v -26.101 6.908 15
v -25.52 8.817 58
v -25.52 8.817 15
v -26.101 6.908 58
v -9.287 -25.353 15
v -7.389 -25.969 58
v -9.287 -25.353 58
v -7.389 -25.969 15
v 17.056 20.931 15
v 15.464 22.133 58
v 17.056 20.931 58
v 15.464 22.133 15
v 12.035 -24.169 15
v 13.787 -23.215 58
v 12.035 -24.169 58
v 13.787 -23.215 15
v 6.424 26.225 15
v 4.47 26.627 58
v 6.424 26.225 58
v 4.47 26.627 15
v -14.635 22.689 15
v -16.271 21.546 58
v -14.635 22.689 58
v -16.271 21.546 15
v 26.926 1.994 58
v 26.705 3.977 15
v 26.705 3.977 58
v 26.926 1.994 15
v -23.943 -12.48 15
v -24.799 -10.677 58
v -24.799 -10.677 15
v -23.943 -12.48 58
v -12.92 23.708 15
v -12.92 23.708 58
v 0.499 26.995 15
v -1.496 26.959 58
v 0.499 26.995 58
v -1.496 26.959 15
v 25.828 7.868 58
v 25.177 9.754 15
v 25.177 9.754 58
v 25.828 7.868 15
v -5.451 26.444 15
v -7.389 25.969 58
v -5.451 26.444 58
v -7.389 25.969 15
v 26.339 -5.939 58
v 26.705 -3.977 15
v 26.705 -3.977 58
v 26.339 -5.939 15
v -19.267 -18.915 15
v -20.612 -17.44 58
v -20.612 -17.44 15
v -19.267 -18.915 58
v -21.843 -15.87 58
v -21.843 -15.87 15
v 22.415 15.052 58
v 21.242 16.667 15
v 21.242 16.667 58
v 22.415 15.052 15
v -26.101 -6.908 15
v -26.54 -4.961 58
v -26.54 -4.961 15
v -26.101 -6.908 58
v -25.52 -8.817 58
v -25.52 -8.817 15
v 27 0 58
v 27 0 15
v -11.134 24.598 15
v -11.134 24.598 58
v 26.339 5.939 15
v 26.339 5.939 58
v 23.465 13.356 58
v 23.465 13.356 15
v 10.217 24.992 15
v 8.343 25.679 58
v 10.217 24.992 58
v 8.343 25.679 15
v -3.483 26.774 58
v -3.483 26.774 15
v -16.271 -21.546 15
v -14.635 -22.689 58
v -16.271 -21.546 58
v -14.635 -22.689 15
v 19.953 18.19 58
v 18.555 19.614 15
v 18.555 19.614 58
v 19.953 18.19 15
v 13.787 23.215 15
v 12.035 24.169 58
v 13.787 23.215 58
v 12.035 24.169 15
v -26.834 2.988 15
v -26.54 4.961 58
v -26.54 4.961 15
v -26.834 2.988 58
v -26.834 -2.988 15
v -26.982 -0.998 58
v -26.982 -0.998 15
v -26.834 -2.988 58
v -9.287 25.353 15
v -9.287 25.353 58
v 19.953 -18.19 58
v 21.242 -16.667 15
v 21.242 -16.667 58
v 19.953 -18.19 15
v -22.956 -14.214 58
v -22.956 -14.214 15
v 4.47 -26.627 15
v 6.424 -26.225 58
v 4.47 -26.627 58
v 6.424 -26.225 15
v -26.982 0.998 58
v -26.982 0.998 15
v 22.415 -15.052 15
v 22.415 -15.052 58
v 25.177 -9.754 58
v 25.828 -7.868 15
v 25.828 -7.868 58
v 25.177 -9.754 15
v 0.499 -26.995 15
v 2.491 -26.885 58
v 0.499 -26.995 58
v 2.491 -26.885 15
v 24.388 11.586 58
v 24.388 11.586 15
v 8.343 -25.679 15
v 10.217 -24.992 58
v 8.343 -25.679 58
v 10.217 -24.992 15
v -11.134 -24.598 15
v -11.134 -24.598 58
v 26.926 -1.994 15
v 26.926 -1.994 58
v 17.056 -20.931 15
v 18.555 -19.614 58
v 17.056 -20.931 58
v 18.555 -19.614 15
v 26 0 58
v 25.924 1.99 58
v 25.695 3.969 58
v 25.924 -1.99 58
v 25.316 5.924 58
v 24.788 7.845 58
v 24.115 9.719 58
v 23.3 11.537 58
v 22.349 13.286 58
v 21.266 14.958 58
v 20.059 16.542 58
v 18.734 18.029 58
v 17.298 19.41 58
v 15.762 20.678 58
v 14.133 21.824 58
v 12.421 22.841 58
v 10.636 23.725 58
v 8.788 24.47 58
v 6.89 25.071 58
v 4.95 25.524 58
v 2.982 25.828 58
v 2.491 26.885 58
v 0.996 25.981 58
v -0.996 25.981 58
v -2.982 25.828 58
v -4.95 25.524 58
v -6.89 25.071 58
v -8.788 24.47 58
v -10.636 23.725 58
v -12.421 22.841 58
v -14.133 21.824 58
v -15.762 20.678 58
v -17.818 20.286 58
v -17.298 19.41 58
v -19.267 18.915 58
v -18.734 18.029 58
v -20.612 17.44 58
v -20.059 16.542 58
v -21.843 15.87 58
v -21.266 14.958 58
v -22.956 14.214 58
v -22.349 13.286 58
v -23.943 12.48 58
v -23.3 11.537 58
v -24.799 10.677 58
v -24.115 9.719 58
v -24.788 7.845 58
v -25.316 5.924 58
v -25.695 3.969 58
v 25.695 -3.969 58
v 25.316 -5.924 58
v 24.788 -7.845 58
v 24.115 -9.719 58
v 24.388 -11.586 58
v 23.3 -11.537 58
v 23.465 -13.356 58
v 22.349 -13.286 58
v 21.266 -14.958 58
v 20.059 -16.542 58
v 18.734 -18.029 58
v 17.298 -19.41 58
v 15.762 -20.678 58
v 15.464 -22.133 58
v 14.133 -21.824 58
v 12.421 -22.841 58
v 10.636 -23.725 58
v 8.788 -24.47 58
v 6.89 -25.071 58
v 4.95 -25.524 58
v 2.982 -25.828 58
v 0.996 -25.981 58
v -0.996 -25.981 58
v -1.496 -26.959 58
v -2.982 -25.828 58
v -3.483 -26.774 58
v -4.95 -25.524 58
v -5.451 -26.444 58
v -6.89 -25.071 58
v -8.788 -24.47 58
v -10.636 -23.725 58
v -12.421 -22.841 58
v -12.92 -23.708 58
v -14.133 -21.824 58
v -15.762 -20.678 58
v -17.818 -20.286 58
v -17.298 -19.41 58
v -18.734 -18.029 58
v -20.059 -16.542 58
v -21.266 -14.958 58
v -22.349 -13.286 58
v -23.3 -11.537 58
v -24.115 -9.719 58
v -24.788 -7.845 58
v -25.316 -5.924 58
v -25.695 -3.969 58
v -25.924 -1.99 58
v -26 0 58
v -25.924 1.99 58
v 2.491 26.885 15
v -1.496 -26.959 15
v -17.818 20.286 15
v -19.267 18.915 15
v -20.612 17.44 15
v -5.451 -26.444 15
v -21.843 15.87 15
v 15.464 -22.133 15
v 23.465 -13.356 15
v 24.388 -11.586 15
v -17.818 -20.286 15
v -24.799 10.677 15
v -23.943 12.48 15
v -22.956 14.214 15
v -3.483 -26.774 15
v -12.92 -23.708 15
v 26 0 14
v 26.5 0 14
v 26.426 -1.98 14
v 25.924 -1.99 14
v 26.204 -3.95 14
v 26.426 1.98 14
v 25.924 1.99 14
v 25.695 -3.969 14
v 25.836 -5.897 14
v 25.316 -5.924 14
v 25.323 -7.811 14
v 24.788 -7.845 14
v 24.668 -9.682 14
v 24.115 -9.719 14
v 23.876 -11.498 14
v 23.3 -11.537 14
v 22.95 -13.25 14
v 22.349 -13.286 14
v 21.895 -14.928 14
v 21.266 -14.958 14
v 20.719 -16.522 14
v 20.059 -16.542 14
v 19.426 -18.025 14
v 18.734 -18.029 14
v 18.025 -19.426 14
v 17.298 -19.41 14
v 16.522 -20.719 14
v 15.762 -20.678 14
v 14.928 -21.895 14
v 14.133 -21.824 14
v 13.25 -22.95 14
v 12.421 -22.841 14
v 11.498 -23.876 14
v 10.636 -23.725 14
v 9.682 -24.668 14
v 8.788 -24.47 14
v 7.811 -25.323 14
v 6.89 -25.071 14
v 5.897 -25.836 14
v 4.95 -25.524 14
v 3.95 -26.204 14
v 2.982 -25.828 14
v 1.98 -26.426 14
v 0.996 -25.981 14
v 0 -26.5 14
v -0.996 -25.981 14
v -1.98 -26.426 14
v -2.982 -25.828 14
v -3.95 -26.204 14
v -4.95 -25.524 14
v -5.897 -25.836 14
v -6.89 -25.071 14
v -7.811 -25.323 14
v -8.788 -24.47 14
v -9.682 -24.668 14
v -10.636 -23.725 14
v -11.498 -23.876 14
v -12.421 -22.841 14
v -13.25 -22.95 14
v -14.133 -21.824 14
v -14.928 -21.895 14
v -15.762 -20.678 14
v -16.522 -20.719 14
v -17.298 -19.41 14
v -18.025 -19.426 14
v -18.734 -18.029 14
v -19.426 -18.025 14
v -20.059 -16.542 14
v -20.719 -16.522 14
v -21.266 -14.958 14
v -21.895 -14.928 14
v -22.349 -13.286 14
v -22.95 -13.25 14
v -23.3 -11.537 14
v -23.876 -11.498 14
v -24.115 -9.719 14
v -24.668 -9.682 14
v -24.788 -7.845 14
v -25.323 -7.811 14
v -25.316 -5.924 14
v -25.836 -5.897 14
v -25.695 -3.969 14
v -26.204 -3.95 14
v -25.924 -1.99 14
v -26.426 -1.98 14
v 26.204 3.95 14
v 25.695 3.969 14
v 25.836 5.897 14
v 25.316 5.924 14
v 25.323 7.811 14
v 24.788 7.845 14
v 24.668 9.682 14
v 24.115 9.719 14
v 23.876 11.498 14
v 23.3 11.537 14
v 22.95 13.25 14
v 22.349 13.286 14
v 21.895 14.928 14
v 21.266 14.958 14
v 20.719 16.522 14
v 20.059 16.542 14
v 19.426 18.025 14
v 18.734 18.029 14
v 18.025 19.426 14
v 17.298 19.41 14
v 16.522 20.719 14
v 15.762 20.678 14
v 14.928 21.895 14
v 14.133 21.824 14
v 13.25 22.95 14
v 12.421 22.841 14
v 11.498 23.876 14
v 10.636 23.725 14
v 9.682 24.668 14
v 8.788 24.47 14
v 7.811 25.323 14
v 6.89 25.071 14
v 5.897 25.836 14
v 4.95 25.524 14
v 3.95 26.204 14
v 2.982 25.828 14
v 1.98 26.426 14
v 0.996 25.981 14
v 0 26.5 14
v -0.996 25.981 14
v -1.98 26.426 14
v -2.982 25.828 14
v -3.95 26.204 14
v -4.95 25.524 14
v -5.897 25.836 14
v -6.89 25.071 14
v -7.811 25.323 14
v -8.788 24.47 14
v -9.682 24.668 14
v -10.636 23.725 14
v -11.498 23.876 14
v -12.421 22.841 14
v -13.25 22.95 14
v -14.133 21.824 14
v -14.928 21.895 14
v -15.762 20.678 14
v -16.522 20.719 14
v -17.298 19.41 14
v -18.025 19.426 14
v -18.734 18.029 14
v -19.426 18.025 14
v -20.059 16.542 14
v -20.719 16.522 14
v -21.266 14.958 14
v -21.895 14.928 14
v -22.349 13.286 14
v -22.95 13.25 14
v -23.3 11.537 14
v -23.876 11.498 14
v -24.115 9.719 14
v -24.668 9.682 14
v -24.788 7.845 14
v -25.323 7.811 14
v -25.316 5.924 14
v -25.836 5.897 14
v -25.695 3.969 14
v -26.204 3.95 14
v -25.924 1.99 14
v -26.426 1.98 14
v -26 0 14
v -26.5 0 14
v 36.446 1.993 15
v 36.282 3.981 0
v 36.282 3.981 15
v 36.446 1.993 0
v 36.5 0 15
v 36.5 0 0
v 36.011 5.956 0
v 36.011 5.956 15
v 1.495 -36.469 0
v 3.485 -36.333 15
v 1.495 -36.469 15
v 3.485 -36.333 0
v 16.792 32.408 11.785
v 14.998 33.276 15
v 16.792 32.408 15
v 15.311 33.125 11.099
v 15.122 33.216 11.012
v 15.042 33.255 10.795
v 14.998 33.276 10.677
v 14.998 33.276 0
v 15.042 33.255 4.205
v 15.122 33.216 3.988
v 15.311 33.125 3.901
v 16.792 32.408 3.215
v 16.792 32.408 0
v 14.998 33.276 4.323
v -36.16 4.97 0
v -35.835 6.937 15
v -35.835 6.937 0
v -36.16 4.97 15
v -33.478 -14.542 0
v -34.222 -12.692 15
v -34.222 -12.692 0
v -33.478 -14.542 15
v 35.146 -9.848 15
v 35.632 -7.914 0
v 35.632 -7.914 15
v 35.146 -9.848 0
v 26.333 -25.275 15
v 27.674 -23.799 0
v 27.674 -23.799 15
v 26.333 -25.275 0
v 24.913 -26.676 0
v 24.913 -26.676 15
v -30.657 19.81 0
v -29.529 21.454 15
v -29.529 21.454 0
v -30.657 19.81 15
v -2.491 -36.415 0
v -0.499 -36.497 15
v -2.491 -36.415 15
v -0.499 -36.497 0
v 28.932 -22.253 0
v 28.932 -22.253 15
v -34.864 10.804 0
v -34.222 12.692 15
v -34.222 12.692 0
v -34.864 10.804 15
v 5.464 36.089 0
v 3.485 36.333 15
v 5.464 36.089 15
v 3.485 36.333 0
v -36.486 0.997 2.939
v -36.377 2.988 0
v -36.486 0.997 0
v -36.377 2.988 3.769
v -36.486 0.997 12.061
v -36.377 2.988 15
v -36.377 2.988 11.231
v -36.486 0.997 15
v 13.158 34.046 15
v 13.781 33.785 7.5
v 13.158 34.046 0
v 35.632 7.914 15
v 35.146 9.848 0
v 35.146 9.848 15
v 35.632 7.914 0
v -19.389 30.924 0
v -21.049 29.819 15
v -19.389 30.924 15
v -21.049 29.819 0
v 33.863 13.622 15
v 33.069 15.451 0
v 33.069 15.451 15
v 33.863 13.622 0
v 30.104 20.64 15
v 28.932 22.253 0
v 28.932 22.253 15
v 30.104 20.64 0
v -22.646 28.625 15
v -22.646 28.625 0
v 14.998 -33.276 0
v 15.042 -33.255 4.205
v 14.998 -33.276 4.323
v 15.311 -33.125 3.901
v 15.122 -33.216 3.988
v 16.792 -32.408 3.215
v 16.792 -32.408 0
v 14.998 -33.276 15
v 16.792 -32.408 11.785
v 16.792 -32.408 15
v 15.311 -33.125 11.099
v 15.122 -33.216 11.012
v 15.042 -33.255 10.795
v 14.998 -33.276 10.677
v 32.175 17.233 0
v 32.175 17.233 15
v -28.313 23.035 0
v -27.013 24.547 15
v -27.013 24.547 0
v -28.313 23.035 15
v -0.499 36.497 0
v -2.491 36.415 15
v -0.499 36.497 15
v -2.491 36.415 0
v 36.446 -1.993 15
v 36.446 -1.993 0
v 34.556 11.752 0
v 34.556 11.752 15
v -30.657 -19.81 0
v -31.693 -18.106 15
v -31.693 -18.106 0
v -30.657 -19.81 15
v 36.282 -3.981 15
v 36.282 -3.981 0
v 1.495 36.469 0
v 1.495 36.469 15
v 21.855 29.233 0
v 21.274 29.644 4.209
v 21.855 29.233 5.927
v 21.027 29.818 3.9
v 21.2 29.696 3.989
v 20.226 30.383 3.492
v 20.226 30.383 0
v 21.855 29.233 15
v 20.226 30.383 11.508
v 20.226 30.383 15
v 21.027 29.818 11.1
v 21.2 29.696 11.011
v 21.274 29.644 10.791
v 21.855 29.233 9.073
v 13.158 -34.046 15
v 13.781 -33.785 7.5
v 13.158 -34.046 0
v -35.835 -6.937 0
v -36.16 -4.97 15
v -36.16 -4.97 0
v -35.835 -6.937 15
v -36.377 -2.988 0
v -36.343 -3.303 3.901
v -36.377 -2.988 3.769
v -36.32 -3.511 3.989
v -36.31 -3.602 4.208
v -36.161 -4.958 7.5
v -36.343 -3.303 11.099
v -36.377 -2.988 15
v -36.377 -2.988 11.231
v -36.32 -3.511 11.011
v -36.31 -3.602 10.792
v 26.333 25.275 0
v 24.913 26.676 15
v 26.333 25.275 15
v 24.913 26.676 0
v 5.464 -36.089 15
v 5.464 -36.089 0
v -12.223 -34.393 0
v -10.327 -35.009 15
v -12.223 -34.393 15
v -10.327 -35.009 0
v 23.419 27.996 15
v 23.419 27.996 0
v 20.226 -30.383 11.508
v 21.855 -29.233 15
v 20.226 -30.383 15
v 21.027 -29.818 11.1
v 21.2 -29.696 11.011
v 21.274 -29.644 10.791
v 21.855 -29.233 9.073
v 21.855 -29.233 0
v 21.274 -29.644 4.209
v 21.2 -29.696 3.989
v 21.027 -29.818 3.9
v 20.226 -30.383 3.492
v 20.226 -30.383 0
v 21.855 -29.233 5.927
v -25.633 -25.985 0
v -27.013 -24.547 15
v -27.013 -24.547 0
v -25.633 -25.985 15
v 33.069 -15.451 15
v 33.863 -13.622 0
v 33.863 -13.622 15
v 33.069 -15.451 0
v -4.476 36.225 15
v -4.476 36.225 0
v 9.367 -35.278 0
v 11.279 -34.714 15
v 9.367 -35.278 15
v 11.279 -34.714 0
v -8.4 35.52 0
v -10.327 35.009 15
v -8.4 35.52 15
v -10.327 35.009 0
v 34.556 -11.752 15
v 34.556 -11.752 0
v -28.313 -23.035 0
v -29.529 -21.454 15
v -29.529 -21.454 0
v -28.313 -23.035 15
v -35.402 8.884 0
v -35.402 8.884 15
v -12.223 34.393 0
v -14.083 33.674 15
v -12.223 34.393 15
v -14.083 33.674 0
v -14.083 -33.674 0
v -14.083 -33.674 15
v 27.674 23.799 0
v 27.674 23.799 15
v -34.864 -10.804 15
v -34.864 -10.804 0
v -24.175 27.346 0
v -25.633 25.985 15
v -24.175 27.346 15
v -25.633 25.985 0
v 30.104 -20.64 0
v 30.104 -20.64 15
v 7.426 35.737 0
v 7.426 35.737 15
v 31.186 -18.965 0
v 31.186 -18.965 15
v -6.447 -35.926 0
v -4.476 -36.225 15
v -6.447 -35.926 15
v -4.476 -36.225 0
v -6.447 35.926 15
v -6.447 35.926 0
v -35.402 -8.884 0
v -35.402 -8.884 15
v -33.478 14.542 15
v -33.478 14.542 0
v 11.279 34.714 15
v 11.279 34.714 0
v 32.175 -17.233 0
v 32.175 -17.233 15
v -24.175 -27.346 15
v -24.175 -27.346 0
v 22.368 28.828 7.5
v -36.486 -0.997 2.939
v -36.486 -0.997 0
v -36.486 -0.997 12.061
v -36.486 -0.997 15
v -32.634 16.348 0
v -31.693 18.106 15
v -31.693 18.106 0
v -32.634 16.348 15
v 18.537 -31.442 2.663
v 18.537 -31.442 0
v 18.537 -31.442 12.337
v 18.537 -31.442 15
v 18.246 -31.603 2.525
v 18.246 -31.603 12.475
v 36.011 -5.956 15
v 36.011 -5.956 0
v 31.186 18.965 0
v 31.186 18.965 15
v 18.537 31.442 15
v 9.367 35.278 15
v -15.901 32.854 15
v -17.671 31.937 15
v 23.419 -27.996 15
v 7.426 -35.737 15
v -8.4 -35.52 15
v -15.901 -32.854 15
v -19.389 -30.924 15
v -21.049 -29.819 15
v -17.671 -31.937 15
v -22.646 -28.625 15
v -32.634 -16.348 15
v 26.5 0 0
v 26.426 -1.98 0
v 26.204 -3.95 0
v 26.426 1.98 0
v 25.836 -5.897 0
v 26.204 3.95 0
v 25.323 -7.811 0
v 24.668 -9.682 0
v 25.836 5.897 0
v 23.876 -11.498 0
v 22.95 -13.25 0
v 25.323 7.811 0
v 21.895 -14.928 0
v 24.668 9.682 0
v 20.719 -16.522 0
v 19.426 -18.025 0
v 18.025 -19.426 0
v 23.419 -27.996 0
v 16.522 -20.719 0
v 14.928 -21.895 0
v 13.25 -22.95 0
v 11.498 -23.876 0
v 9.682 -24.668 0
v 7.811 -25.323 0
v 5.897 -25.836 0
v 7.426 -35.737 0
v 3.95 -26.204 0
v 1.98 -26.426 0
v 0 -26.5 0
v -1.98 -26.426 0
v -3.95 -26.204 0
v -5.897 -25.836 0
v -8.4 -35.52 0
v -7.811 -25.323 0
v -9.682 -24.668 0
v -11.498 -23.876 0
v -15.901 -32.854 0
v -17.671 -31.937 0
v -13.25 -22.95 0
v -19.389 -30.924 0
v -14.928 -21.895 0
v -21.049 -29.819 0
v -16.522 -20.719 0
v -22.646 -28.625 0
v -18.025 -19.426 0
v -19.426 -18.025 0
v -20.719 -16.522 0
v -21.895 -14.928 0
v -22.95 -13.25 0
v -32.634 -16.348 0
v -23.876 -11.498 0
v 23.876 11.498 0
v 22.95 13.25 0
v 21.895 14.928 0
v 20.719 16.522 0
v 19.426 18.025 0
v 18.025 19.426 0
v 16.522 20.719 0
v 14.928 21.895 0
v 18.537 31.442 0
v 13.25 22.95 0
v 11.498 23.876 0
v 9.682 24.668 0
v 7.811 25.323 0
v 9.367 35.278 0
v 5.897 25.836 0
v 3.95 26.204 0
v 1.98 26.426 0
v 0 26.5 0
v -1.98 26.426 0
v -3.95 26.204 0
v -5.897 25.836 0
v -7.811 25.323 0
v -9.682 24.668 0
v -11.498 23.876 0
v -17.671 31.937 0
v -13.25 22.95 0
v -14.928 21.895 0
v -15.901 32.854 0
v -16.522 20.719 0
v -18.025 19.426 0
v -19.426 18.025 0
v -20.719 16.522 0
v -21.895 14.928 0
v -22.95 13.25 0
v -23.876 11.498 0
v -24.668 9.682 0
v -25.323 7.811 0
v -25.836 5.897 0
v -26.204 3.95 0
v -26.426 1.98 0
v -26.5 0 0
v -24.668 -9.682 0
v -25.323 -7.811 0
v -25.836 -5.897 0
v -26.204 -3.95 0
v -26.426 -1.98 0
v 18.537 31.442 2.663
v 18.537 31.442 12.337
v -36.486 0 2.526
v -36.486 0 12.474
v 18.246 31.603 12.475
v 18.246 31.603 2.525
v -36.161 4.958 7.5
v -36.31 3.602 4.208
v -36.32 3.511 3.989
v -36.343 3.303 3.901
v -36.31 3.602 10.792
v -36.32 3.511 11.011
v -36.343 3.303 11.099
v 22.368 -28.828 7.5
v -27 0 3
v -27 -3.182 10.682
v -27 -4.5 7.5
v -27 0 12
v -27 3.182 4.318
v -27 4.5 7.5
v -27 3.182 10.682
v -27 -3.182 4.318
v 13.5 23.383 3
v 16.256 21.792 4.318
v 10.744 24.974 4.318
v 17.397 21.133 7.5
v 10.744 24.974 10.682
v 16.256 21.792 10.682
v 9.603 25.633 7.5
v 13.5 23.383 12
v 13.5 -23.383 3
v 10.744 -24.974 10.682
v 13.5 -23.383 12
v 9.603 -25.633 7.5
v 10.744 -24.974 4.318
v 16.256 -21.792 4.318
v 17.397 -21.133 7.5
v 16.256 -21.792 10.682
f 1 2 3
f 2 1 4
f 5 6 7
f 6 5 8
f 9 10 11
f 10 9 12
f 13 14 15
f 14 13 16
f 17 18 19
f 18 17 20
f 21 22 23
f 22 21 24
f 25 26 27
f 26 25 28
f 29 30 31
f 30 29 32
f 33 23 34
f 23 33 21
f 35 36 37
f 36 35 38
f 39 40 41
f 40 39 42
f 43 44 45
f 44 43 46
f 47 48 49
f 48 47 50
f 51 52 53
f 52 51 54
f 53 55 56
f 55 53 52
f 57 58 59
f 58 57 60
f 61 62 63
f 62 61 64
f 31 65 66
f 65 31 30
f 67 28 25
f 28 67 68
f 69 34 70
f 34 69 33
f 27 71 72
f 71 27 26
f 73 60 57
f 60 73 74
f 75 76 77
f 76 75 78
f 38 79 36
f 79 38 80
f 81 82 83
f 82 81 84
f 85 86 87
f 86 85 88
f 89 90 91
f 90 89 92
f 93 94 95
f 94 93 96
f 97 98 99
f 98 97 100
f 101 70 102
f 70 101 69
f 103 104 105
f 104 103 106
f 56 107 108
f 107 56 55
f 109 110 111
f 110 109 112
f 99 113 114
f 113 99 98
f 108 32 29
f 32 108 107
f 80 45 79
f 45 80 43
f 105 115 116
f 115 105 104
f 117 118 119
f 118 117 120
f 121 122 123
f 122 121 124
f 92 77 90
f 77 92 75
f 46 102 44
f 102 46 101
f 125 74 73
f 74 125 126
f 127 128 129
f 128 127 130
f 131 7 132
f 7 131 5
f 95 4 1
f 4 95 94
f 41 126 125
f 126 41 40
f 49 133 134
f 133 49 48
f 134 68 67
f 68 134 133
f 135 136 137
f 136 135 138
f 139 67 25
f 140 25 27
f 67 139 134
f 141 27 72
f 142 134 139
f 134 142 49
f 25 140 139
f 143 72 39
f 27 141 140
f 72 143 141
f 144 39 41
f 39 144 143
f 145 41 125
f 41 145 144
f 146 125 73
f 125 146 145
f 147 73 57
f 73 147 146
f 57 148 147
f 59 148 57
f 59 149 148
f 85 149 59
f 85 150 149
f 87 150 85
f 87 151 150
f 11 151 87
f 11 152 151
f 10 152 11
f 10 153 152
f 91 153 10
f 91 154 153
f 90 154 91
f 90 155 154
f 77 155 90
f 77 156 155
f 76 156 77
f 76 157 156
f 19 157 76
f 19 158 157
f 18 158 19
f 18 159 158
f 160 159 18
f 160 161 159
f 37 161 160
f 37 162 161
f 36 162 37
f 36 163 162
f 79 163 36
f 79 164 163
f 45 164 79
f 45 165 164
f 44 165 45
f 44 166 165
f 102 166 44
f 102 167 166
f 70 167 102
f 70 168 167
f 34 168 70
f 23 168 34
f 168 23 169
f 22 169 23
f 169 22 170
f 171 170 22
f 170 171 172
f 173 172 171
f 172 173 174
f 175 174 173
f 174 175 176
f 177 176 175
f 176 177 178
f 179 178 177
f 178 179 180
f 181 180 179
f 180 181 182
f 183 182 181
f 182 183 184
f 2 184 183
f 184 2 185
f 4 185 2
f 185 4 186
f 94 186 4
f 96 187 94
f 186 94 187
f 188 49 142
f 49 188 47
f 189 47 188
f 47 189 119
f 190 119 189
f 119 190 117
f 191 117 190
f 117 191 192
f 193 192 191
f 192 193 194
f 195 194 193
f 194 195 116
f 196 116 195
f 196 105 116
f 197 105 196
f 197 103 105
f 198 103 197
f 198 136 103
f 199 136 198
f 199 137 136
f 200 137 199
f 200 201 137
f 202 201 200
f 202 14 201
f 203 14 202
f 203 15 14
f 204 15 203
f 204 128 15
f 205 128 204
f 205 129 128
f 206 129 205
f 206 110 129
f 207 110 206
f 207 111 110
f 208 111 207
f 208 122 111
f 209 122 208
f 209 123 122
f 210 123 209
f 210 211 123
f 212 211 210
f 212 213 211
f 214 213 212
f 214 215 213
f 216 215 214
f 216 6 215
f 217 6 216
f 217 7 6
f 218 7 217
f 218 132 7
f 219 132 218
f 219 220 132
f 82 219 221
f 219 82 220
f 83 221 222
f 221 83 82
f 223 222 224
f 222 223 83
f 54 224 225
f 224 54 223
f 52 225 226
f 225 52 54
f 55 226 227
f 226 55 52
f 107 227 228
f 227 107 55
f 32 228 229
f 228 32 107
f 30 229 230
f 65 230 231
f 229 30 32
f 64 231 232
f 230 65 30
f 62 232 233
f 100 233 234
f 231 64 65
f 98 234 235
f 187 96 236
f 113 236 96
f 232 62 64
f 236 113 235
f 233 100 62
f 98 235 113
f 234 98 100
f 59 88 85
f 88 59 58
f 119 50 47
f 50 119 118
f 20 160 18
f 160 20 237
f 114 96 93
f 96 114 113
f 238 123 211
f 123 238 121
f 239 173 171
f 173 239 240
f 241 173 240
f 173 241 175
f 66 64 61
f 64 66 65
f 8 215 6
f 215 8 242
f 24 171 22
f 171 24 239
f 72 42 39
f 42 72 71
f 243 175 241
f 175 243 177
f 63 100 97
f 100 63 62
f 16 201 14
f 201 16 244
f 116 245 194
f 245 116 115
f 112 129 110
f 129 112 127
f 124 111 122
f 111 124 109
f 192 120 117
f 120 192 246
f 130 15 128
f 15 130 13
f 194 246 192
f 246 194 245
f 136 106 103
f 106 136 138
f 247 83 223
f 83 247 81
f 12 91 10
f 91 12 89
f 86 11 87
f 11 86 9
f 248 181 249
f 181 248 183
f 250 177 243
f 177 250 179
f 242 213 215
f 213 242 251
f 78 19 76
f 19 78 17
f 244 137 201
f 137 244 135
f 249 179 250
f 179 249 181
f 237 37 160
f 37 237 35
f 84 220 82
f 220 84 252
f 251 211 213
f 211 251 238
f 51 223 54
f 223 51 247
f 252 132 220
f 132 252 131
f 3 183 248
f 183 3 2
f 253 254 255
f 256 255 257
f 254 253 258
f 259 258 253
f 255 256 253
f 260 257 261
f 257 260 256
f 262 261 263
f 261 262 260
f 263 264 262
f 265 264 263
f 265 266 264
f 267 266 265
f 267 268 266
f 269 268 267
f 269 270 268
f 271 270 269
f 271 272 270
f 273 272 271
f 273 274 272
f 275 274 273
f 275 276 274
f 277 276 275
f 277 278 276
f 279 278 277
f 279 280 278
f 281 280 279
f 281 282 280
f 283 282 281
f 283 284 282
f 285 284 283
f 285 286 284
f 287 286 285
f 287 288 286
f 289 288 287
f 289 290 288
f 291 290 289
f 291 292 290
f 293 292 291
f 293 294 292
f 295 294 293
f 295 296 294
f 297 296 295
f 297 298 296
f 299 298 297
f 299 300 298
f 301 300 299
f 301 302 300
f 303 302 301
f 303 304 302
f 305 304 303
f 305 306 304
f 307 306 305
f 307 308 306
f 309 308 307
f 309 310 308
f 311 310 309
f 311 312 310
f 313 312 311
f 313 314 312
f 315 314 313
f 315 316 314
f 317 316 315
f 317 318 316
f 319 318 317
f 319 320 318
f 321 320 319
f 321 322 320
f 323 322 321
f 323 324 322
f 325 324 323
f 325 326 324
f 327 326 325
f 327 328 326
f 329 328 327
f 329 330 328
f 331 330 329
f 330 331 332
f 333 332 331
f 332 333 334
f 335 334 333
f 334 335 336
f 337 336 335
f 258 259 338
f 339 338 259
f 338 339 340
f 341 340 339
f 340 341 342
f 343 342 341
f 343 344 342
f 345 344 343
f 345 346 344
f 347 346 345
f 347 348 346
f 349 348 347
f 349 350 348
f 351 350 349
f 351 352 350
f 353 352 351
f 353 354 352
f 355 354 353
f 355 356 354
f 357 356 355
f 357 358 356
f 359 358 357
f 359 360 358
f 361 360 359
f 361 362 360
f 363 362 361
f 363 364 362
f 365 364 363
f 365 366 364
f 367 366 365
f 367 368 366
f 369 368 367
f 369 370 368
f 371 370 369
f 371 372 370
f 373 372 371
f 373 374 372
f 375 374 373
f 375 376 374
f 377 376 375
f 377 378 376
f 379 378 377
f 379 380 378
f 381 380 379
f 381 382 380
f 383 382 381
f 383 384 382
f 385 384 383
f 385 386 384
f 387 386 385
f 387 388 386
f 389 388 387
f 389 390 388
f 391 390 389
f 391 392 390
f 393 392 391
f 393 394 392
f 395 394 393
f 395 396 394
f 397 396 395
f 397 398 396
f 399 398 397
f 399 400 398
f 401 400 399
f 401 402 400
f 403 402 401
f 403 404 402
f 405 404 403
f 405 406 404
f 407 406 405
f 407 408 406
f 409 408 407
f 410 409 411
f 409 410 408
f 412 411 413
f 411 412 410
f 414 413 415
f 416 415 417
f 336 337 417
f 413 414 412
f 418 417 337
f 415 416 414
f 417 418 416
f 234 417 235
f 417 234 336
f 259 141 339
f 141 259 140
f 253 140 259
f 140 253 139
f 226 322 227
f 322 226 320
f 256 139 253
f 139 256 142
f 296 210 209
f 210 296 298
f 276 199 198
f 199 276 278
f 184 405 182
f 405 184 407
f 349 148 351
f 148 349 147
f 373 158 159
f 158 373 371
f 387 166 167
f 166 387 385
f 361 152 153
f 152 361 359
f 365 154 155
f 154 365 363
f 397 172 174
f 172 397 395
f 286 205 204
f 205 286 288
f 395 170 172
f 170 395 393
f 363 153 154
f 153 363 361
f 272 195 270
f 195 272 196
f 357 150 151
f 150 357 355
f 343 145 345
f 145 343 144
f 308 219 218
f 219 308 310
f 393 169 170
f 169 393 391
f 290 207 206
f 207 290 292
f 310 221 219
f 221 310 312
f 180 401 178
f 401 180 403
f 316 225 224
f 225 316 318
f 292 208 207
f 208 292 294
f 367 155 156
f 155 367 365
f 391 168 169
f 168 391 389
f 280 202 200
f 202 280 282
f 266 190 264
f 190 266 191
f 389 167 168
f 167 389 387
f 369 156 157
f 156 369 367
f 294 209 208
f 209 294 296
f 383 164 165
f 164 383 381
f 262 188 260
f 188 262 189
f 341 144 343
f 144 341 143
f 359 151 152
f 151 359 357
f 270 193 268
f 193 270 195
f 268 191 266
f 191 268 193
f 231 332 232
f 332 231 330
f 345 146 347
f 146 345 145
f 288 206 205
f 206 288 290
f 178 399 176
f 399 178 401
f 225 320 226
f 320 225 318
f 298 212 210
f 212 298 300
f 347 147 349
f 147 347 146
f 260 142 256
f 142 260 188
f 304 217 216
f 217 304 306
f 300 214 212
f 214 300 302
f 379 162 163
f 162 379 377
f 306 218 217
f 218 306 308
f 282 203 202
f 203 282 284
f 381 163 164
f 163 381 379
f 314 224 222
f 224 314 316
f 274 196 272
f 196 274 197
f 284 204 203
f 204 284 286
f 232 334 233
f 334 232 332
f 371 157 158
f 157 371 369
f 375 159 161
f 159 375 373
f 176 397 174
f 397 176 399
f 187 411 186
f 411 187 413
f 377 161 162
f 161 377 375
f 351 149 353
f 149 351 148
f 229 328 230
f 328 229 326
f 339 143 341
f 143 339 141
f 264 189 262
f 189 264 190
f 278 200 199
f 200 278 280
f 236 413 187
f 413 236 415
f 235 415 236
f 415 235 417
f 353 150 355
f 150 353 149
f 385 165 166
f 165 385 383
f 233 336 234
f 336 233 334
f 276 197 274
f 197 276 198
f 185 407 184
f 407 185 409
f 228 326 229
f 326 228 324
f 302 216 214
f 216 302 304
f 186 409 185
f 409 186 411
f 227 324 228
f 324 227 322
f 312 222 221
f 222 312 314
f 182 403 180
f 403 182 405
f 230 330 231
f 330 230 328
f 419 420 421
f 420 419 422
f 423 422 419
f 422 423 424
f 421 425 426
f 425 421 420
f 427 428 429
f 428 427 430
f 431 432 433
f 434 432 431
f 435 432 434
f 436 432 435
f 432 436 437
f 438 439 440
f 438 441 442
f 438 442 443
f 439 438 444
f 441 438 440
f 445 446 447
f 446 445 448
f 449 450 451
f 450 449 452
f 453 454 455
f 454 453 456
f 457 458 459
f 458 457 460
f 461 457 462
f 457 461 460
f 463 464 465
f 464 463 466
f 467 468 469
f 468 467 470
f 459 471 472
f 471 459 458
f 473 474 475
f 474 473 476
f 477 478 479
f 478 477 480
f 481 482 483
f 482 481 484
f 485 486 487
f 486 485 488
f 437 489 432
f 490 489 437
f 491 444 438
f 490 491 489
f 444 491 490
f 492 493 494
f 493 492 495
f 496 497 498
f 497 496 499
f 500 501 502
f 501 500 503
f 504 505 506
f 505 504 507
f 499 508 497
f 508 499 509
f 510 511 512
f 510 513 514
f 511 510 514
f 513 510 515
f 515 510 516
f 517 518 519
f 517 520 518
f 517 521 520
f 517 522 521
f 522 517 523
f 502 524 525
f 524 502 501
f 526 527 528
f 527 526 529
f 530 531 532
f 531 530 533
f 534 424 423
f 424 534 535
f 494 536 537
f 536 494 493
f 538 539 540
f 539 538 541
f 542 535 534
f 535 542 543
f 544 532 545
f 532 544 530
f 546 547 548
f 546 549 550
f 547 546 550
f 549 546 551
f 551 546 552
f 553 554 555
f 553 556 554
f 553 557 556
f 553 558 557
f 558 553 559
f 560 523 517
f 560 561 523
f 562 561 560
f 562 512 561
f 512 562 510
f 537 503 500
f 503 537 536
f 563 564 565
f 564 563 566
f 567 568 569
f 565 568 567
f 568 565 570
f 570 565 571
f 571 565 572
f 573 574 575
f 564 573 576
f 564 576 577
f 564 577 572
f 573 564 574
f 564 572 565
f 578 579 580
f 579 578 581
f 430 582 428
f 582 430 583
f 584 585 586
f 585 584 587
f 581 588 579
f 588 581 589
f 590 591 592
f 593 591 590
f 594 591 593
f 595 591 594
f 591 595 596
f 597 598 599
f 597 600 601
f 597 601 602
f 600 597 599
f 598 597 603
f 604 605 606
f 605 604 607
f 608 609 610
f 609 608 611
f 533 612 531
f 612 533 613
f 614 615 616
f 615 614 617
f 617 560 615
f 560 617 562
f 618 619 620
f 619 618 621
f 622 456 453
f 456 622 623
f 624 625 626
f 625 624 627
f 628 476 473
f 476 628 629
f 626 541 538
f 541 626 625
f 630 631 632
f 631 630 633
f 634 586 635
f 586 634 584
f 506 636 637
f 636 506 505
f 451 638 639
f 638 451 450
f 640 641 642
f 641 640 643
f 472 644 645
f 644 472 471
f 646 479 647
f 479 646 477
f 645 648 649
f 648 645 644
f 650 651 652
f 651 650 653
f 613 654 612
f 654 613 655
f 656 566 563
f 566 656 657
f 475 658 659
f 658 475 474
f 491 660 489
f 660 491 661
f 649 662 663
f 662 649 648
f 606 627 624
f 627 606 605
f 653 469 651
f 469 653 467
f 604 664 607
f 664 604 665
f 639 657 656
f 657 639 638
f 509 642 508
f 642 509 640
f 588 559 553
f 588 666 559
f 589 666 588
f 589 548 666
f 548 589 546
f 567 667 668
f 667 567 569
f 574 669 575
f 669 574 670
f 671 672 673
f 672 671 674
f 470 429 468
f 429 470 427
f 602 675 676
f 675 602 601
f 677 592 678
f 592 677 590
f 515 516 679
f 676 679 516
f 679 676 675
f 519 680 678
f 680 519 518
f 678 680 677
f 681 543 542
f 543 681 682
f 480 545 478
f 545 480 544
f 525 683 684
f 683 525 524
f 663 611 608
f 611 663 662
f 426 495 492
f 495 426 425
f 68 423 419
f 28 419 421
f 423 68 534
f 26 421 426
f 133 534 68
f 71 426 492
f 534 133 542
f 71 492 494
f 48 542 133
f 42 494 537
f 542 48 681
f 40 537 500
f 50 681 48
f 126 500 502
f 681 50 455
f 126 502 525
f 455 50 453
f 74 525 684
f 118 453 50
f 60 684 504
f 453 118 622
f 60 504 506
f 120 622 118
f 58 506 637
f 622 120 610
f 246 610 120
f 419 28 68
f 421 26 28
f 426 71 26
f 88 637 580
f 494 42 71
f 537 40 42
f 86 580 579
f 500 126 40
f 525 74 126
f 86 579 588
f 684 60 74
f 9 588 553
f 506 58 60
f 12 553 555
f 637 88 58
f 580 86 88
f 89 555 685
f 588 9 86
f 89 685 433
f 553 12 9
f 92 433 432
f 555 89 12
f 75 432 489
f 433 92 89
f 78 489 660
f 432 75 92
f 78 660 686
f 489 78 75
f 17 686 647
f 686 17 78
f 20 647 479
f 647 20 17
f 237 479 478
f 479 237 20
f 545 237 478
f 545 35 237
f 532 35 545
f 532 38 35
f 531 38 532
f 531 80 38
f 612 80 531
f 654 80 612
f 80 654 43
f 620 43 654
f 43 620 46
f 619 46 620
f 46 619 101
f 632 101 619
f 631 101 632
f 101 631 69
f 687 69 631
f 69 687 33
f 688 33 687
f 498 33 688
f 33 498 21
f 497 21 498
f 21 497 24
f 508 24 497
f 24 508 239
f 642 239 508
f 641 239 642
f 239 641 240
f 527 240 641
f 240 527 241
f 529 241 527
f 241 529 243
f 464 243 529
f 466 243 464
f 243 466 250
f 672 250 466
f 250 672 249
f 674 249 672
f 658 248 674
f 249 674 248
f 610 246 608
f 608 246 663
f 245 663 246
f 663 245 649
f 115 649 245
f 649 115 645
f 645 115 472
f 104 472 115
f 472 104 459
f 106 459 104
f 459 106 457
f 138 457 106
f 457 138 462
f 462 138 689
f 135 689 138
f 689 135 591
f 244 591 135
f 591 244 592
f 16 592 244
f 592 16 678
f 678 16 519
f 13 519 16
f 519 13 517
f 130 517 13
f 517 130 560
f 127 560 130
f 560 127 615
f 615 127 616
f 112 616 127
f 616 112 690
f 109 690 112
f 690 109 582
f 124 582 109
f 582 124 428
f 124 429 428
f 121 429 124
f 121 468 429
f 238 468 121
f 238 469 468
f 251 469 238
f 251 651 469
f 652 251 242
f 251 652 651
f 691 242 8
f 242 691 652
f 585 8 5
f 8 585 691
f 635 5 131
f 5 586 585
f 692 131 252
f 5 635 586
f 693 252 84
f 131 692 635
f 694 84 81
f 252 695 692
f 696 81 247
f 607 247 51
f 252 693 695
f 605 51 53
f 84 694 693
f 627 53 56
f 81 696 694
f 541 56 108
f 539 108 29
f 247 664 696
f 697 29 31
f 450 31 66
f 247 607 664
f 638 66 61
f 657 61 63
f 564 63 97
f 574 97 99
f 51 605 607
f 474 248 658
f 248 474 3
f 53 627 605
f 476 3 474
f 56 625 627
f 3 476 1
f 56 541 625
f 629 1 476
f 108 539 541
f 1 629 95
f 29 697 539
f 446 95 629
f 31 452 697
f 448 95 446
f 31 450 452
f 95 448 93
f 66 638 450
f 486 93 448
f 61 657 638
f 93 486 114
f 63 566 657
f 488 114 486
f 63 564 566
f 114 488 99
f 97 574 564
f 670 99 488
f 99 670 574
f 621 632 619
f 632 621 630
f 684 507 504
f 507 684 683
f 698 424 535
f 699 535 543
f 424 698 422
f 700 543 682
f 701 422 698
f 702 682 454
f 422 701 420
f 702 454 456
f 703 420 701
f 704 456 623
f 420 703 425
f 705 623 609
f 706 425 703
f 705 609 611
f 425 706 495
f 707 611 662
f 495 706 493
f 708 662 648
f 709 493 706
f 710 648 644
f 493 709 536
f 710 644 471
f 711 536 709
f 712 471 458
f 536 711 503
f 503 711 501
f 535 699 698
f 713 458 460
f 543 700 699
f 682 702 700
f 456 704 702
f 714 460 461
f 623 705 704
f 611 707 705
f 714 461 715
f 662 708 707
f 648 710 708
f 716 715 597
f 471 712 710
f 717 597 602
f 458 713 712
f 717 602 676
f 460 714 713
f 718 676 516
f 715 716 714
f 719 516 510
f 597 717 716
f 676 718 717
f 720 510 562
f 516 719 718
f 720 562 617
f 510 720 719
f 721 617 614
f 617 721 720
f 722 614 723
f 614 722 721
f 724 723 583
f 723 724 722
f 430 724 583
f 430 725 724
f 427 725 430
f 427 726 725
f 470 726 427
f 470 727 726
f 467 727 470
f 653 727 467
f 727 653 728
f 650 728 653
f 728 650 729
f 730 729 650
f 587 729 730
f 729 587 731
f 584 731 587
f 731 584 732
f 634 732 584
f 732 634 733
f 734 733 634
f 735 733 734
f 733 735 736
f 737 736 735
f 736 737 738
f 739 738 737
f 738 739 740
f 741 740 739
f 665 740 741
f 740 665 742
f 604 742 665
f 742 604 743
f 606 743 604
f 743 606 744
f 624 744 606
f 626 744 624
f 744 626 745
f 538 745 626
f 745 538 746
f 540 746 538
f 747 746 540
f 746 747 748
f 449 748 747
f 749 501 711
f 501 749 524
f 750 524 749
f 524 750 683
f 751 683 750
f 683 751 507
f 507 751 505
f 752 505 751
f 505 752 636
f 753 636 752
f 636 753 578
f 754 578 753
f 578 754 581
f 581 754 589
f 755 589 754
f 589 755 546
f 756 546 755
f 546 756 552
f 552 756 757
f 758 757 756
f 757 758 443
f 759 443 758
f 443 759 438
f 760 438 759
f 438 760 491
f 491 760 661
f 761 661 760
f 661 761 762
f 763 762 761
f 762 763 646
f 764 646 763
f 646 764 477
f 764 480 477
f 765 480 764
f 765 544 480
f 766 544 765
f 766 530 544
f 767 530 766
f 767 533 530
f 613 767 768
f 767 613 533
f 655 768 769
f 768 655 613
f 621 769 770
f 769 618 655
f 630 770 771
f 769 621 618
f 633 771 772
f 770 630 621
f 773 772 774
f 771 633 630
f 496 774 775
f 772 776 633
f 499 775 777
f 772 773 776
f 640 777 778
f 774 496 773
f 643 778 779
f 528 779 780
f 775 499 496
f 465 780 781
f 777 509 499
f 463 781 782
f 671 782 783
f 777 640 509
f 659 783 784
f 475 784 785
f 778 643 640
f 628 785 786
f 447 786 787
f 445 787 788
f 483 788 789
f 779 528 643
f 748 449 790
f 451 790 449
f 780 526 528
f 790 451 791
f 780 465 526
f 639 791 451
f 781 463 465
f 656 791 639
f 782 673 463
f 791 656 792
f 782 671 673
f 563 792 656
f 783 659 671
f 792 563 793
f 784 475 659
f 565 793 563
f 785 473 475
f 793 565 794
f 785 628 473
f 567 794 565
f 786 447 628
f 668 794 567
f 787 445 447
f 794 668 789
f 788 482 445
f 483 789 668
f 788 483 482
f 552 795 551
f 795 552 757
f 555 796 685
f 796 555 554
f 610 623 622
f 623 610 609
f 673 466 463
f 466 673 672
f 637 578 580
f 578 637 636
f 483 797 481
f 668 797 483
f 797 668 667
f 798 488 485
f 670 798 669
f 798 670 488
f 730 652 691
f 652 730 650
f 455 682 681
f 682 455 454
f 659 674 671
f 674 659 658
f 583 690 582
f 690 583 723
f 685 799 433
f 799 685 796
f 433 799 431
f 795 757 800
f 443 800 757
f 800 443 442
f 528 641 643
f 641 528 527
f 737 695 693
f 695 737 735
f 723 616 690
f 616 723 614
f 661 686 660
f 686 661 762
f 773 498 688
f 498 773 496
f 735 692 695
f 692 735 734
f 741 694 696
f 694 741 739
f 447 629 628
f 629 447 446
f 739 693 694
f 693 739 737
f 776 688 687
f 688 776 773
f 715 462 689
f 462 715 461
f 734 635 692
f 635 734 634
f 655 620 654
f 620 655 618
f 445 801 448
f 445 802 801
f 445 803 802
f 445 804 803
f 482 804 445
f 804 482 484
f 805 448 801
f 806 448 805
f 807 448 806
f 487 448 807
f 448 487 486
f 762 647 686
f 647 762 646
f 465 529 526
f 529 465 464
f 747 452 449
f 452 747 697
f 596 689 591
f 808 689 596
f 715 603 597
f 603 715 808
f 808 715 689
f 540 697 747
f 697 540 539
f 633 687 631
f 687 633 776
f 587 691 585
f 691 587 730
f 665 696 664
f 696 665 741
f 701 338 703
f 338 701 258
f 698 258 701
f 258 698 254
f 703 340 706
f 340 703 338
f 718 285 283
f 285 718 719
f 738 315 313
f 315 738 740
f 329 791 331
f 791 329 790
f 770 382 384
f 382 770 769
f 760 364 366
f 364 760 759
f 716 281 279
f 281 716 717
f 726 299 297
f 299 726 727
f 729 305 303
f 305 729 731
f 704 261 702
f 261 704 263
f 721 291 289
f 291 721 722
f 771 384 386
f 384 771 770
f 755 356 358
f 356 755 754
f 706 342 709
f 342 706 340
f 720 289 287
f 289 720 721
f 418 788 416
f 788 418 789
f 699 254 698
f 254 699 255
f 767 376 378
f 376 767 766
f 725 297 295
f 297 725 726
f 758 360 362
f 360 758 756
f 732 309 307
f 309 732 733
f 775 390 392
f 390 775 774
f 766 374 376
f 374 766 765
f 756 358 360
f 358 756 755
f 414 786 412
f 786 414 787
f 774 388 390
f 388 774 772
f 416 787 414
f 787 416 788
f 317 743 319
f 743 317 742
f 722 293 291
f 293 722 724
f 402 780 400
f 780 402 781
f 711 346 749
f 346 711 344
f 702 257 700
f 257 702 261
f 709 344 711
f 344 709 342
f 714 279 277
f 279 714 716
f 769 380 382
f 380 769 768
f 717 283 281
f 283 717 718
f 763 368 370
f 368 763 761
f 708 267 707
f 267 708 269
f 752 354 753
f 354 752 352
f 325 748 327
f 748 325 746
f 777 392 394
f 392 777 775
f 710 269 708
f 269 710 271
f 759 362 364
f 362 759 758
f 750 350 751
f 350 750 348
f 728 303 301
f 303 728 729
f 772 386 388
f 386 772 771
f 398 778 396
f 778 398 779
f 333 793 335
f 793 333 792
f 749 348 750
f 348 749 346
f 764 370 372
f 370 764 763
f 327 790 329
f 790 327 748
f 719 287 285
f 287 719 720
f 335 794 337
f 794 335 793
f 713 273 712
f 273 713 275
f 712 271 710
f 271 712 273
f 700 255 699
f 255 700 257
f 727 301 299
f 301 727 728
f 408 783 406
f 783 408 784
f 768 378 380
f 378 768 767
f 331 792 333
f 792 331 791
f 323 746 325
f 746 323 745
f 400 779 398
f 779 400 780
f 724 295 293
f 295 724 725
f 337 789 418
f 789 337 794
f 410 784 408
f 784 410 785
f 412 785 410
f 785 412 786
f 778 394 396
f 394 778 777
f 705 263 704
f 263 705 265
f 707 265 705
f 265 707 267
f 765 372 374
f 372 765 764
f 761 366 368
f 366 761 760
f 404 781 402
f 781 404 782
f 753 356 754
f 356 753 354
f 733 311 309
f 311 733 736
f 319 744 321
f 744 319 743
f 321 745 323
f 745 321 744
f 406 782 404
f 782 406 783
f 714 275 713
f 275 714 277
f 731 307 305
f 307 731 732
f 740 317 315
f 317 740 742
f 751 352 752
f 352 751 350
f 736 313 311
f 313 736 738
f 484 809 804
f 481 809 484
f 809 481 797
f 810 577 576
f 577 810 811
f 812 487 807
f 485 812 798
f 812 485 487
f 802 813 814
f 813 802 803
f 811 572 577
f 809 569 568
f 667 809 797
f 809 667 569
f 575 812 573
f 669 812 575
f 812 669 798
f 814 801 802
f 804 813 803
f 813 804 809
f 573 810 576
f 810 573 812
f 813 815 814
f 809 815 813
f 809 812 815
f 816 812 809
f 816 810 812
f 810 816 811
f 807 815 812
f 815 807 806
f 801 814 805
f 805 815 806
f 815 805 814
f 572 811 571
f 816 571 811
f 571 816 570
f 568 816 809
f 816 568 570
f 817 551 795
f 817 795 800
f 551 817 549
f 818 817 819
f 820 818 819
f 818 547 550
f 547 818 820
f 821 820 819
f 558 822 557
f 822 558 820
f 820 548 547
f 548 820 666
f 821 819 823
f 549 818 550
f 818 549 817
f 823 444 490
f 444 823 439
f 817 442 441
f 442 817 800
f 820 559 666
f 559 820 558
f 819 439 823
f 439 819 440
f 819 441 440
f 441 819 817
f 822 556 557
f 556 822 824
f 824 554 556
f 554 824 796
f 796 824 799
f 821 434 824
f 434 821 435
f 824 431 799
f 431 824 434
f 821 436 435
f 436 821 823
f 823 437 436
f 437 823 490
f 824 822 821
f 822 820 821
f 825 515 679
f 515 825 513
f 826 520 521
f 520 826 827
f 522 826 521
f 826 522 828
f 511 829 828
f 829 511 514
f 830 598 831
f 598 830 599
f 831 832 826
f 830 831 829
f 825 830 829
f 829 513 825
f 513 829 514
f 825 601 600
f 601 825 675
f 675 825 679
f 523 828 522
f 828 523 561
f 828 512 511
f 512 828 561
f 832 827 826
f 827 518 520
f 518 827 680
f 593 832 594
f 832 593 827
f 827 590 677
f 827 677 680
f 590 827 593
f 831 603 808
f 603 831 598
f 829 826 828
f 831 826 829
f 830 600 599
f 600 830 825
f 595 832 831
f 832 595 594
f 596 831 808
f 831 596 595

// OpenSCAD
// [FL_INDEX: keywords="openscad, 3d_parametric, Resizable_Loose_Filament_Spool, csg_solid" | COT="Parametric OpenSCAD design from 3DCodeverse"]
// Title: Resizable Loose Filament Spool

// Loose filament spindle.
// ======================
//
// This spindle is designed to insert into a loose spool of filament and spin
// around a provided axis either on the back of a Replicator or externally.
//
// Terminology:
//
//	Hub - centre support for the spindle - has embedded spokes.
//	Centre Hole - the hole in the centre of the hub.
//	Spoke - the spoke connecting the hub to the bracket.
//	Bracket - the outer support structure designed to hold the spool of filament.
//	Plug - the nub of plastic which inserts into plug holes in the spindle
// 		or the spokes.
//
// Notes:
//
//	Check that you can assemble a full set of 3 spokes and brackets which
//	will fit loosely inside the spool of filament.
//
//	The idea is to NOT stretch the filament inserting the full hub.   There
///  is a need for loose filament to have some room to move as it unwinds. 
//
//	Use the following sequence for insertion:
//
//		1) Insert one spoke/bracket set into the hub and insert this
//			into the spool of filament.
//		2) Insert the second spoke/bracket set into the spool of
//			filament and then into the hub.
//		3) Insert the second spoke/bracket set into the spool of
//			filament and then tilting the hub up slightly insert
//			into the final plug hole on the hub.
//
//	You should print Brackets with support (for the plug).
//	You should print Hubs with support (for the plug holes).
//	Print Spokes vertically at 100% - NO support is best. Horizontally
//		printed spokes will split.

/* [Global] */

// Which part are you going to build?
part = "Hub"; // [Hub:Hub, Spoke:Spoke, Bracket:Bracket]

/* [Hub] */

// Use External if you are not printing for the back of a Replicator.
Hub_Type = "Replicator"; // [Replicator, External]

// Use 52 for Replicator.
Centre_Hole_Diameter = 52; // [20:80]

// Use 15 for Replicator.
Hub_Thickness = 15; // [15:50]

/* [Spoke] */

// Use 20 as a starting point for replicator hub.
Spoke_Length =  20; // [10:100]

/* [Bracket] */

// Use 50 for Replicator.
Bracket_Diameter = 50;  // [20:50]

// Use 10 for Replicator.
Bracket_Thickness = 10;

// Use 8 for Replicator.
Bracket_Depth = 8 ;

// in units of Bracket_Thickness. Use 1 for Replicator.
Bracket_Prong_Length = 1.0;  // [1,2,3,4]

/* [Hidden] */
     
Angular_Resolution = 0.1;
Octagon_Resolution = 45 ;
Decagon_Resolution = 36 ;

Plug_Height = 10;  // plug height
Plug_Hole_Width = 10;  // plug hole width
Plug_Wall_Thickness = 3;   // plug wall thickness
Plug_Taper = 0.5; // Plug_Taper of plug in mm
Plug_Clearance = 0.15; // Difference between plug and plughole diameters

Filiament_Hole = 4;  // Hole in bracket when storing filament.

/////////////////////////////////////////////////////////////////////////////////////////////////////////////////

print_part();

module print_part() {	
	if (part == "Hub") {
		Hub();
	} else if (part == "Spoke") {
		Spoke();
	} else {
		Bracket();
	}
}

module highlight(this_tab) {
  if (preview_tab == this_tab) {
    color("red") child(0);
  } else {
    child(0);
  }
}

module Hub() {

	Hole_Offset = Hub_Thickness*.5*-1;
	Plug_Offset = ((Centre_Hole_Diameter/2) + Plug_Height+1)*-1;  // Add 1 to offset for Repg <<<<<<<<<<<<<
	
// Spacer for Replicator.
	if (Hub_Type == "Replicator") {
		translate([0,0,Hub_Thickness-1]) tube(44,(Centre_Hole_Diameter+2)/2.0,1); // For inside ring.
	}

// Main Hub	
	difference() {
		tube(Hub_Thickness,(Centre_Hole_Diameter + 1 + (Plug_Height*2))/2.0,Plug_Height);  // Add 1 to radius for Repg <<<<<<<<<<<

// Radial Holes.
		union(){
			rotate([0,90,0]) translate([Hole_Offset,0,Plug_Offset])   plugHole();
			rotate([120,90,0]) translate([Hole_Offset,0,Plug_Offset])   plugHole();
			rotate([240,90,0]) translate([Hole_Offset,0,Plug_Offset])   plugHole();
		}
	}
}

module tube(height, radius, wall) {
	difference(){
		cylinder(height, radius, radius, $fa=Angular_Resolution);
		cylinder(height, radius-wall, radius-wall, $fa=Angular_Resolution);
	}
}

module octagontube(height, radius, wall) {
	difference(){
		cylinder(height, radius, radius, $fa=Octagon_Resolution);
		cylinder(height, radius-wall, radius-wall, $fa=Octagon_Resolution);
	}
}

module decagontube(height, radius, wall) {
	difference(){
		cylinder(height, radius, radius, $fa=Decagon_Resolution);
		cylinder(height, radius-wall, radius-wall, $fa=Decagon_Resolution);
	}
}

module plugHole() {
      cylinder(Plug_Height,Plug_Hole_Width/2,Plug_Hole_Width/2 - Plug_Taper,$fa=Octagon_Resolution);
}

module plug() {
      cylinder(Plug_Height,(Plug_Hole_Width-Plug_Clearance)/2,(Plug_Hole_Width-Plug_Clearance)/2 - Plug_Taper,$fa=Octagon_Resolution);
}

module Spoke() {
	difference() {
		union() {
  			octagontube(Spoke_Length,(Plug_Hole_Width+Plug_Wall_Thickness)/2,Plug_Wall_Thickness*2/2,$fa=Octagon_Resolution);
  			translate([0,0,Spoke_Length*0.99]) plug();
		}
		plugHole();
	}
}

module Bracket_Build(diameter, thickness, depth, length){

	difference() {

		union() {

// Build half a decagon tube as base for bracket.
			rotate([90,0,0])
			difference(){
				decagontube(thickness, diameter, depth) ;
				translate([diameter*-1,diameter*-1,0]) cube([diameter*2,diameter,thickness]);
			} 

// Extend Forks.
    			if (length > 1 ) {
				translate([diameter*-0.99,thickness*-1,thickness*(length-1)*-0.99]) cube([thickness*0.75,thickness,thickness*(length-1)]);
   	 			translate([diameter-(thickness*0.75),thickness*-1,thickness*(length-1)*-0.99]) cube([thickness*0.75,thickness,thickness*(length-1)]);
    			}

// Add rounded top to forks.
			rotate([90,0,0]) translate([diameter*-0.91,(thickness*(length-1)*-1) + (thickness*-0.10),0]) cylinder(thickness,thickness/2,thickness/2,$fa=Angular_Resolution);
			rotate([90,0,0]) translate([diameter*0.91,(thickness*(length-1)*-1) + (thickness*-0.10),0]) cylinder(thickness,thickness/2,thickness/2,$fa=Angular_Resolution);

// Add Plug to top.	
     		translate([thickness*-1,thickness*-1,diameter*0.95])cube([thickness*2,thickness,thickness/4]);
			translate([0,thickness/2*-1,diameter])plug();
		} // Union

// Insert filament holes.
		union() {
          	rotate([90,0,0]) translate([diameter*-0.91,(thickness*(length-1)*-1) + (thickness*-0.10),0]) cylinder(thickness,Filiament_Hole/2,Filiament_Hole/2,$fa=Angular_Resolution);
			rotate([90,0,0]) translate([diameter*0.91,(thickness*(length-1)*-1) + (thickness*-0.10),0]) cylinder(thickness,Filiament_Hole/2,Filiament_Hole/2,$fa=Angular_Resolution);
		}
	} //difference
}

module Bracket(){

	rotate([90,0,0]) translate([0,Bracket_Thickness,0]) Bracket_Build(Bracket_Diameter, Bracket_Thickness, Bracket_Depth, Bracket_Prong_Length);
}
